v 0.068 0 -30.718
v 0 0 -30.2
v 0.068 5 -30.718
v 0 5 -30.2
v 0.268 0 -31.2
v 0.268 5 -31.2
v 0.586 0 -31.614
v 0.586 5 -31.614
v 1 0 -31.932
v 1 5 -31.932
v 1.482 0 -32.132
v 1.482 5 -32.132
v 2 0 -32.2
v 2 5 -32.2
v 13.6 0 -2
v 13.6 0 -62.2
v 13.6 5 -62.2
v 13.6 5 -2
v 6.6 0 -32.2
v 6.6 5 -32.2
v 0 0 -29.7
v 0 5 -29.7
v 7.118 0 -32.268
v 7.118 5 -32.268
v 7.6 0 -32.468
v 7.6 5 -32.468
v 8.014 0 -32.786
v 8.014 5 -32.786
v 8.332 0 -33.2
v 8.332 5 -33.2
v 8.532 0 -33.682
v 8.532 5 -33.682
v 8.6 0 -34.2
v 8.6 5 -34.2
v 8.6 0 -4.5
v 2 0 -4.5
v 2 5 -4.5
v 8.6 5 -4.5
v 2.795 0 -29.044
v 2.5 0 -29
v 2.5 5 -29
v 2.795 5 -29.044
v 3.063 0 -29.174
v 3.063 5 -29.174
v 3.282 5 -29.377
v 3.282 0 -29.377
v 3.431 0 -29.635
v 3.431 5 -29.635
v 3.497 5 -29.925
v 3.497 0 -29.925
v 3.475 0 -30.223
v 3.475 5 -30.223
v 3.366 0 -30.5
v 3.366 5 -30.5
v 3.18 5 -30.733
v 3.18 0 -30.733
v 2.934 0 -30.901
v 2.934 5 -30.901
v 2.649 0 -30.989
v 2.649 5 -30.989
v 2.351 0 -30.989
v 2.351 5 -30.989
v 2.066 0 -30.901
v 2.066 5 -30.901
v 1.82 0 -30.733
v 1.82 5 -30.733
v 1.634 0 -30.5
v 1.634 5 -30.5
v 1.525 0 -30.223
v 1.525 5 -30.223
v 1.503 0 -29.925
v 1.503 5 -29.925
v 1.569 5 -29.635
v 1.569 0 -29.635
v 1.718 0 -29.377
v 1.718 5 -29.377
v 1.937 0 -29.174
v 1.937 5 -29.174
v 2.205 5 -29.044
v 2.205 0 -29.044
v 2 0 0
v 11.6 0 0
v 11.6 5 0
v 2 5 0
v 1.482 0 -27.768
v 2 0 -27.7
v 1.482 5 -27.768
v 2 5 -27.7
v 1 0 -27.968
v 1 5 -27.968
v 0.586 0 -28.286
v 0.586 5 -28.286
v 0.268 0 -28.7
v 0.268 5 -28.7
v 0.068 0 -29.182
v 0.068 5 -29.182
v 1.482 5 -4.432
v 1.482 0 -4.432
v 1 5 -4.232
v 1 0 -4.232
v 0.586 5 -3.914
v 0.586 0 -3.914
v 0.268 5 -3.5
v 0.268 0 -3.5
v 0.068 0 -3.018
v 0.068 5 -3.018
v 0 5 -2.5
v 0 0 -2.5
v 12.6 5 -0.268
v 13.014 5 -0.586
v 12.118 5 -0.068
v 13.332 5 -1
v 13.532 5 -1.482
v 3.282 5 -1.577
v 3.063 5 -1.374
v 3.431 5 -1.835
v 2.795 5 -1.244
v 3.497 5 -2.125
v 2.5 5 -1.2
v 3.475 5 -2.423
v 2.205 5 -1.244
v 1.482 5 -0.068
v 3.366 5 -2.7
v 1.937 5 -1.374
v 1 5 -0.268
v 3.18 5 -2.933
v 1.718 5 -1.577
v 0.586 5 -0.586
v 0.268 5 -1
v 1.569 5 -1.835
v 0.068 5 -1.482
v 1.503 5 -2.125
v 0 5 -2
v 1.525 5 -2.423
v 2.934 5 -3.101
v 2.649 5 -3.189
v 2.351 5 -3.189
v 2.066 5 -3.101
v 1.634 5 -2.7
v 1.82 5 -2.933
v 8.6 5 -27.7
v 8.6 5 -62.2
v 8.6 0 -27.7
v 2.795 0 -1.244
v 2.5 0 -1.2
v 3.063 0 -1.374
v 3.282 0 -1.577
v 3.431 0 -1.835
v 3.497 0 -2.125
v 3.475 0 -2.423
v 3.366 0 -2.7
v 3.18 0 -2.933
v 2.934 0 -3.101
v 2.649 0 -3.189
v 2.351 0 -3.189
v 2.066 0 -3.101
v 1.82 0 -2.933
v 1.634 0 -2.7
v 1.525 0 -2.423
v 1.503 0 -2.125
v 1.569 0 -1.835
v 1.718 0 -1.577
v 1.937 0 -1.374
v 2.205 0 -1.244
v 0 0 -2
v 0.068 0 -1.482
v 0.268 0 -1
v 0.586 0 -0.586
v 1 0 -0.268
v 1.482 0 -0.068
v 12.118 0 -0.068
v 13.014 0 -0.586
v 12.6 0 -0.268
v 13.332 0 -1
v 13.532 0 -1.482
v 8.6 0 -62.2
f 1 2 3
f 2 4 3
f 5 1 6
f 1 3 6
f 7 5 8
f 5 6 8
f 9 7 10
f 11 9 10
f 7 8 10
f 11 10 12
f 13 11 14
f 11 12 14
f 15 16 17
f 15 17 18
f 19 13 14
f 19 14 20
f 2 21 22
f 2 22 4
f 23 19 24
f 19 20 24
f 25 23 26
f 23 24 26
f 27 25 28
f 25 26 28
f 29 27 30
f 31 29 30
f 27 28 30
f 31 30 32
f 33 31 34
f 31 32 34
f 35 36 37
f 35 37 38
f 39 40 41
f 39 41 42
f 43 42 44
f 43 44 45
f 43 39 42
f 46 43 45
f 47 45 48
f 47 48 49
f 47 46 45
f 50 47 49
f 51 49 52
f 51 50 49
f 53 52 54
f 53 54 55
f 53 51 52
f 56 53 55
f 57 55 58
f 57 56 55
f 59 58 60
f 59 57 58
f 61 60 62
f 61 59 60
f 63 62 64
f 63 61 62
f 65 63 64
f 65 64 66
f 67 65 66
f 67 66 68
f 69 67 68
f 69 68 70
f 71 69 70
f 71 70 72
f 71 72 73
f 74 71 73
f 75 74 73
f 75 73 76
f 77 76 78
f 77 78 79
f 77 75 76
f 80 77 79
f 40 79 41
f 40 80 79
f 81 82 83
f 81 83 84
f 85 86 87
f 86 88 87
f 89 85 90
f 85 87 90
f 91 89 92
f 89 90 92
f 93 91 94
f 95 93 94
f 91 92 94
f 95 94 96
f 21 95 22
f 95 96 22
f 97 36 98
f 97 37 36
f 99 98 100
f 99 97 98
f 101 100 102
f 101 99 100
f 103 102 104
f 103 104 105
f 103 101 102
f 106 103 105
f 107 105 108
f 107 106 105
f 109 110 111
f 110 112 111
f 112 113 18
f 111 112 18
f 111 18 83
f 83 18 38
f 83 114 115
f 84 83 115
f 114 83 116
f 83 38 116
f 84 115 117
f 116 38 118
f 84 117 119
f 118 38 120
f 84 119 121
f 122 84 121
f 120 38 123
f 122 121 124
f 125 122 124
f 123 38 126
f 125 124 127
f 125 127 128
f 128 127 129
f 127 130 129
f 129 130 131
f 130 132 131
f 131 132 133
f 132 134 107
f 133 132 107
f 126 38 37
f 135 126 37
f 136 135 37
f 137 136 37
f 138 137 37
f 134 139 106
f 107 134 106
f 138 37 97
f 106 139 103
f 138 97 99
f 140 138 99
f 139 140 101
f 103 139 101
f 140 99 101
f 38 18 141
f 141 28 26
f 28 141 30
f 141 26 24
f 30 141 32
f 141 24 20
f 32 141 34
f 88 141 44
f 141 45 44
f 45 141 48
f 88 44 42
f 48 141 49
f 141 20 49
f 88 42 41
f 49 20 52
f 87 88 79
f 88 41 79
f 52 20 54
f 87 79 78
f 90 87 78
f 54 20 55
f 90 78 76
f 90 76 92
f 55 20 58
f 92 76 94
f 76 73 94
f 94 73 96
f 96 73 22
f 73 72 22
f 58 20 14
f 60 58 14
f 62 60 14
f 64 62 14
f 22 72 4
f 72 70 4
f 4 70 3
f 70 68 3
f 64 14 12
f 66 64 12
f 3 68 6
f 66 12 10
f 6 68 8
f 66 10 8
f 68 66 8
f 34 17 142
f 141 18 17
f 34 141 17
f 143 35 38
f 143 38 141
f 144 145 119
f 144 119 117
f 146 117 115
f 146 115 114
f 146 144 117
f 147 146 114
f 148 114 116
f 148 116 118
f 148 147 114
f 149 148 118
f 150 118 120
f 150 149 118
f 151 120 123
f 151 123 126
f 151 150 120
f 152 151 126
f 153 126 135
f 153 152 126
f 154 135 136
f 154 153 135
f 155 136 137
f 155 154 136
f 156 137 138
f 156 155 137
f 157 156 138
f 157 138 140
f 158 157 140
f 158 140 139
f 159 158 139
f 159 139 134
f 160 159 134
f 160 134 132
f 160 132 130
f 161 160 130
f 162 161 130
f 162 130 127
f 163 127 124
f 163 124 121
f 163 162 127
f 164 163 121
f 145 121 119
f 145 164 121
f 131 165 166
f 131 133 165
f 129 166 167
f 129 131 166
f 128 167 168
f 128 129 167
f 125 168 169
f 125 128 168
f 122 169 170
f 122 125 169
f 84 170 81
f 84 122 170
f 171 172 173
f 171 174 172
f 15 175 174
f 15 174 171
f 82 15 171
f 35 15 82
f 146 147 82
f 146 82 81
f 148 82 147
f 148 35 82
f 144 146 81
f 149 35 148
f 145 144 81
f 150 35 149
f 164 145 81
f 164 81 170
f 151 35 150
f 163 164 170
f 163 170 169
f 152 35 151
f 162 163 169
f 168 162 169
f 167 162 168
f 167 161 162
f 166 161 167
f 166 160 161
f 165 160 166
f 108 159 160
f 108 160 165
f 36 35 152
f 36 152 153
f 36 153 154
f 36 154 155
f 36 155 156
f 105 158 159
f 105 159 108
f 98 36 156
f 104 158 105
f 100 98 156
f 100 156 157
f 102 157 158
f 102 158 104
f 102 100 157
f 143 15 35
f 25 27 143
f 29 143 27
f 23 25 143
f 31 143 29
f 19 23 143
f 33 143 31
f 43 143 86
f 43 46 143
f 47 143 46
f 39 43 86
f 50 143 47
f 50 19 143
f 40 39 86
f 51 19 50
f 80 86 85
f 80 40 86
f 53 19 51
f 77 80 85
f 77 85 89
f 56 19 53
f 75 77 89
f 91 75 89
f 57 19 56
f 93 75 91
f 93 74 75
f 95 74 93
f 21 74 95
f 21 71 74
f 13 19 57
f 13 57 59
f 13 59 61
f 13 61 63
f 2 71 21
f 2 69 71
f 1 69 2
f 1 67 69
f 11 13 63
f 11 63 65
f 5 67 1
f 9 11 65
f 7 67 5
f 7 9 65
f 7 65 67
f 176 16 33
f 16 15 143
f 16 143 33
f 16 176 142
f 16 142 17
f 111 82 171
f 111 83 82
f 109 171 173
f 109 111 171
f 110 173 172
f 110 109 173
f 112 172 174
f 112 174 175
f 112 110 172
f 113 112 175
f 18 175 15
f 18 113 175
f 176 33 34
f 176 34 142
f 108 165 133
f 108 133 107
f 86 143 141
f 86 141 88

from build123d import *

# Parameters (mm, degrees)
SKETCH1_R           = 1
BOSS_EXTRUDE1_DEPTH = 5
FILLET1_R           = 2


with BuildPart() as part:
    # Sketch1 → Boss-Extrude1 (new body)
    with BuildSketch(Plane(origin=(0, 0, 0), x_dir=(1, 0, 0), z_dir=(0, 1, 0))):
        Polygon((0, 4.5), (8.6, 4.5), (8.6, 27.7), (0, 27.7), (0, 32.2), (8.6, 32.2), (8.6, 62.2), (13.6, 62.2), (13.6, 0), (0, 0), align=None)
        with Locations(Location((2.5, 2.2, 0), (0, 0, 270))):
            Circle(SKETCH1_R, mode=Mode.SUBTRACT)
        with Locations(Location((2.5, 30, 0), (0, 0, 270))):
            Circle(SKETCH1_R, mode=Mode.SUBTRACT)
    extrude(amount=BOSS_EXTRUDE1_DEPTH)

    # Fillet1
    fillet1_edges = [part.edges().sort_by_distance(p)[0] for p in [
        (0, 2.5, -4.5),
        (0, 2.5, -27.7),
        (0, 2.5, -32.2),
        (8.6, 2.5, -32.2),
        (13.6, 2.5, 0),
        (0, 2.5, 0),
    ]]
    fillet(fillet1_edges, radius=FILLET1_R)


solid = part.part
